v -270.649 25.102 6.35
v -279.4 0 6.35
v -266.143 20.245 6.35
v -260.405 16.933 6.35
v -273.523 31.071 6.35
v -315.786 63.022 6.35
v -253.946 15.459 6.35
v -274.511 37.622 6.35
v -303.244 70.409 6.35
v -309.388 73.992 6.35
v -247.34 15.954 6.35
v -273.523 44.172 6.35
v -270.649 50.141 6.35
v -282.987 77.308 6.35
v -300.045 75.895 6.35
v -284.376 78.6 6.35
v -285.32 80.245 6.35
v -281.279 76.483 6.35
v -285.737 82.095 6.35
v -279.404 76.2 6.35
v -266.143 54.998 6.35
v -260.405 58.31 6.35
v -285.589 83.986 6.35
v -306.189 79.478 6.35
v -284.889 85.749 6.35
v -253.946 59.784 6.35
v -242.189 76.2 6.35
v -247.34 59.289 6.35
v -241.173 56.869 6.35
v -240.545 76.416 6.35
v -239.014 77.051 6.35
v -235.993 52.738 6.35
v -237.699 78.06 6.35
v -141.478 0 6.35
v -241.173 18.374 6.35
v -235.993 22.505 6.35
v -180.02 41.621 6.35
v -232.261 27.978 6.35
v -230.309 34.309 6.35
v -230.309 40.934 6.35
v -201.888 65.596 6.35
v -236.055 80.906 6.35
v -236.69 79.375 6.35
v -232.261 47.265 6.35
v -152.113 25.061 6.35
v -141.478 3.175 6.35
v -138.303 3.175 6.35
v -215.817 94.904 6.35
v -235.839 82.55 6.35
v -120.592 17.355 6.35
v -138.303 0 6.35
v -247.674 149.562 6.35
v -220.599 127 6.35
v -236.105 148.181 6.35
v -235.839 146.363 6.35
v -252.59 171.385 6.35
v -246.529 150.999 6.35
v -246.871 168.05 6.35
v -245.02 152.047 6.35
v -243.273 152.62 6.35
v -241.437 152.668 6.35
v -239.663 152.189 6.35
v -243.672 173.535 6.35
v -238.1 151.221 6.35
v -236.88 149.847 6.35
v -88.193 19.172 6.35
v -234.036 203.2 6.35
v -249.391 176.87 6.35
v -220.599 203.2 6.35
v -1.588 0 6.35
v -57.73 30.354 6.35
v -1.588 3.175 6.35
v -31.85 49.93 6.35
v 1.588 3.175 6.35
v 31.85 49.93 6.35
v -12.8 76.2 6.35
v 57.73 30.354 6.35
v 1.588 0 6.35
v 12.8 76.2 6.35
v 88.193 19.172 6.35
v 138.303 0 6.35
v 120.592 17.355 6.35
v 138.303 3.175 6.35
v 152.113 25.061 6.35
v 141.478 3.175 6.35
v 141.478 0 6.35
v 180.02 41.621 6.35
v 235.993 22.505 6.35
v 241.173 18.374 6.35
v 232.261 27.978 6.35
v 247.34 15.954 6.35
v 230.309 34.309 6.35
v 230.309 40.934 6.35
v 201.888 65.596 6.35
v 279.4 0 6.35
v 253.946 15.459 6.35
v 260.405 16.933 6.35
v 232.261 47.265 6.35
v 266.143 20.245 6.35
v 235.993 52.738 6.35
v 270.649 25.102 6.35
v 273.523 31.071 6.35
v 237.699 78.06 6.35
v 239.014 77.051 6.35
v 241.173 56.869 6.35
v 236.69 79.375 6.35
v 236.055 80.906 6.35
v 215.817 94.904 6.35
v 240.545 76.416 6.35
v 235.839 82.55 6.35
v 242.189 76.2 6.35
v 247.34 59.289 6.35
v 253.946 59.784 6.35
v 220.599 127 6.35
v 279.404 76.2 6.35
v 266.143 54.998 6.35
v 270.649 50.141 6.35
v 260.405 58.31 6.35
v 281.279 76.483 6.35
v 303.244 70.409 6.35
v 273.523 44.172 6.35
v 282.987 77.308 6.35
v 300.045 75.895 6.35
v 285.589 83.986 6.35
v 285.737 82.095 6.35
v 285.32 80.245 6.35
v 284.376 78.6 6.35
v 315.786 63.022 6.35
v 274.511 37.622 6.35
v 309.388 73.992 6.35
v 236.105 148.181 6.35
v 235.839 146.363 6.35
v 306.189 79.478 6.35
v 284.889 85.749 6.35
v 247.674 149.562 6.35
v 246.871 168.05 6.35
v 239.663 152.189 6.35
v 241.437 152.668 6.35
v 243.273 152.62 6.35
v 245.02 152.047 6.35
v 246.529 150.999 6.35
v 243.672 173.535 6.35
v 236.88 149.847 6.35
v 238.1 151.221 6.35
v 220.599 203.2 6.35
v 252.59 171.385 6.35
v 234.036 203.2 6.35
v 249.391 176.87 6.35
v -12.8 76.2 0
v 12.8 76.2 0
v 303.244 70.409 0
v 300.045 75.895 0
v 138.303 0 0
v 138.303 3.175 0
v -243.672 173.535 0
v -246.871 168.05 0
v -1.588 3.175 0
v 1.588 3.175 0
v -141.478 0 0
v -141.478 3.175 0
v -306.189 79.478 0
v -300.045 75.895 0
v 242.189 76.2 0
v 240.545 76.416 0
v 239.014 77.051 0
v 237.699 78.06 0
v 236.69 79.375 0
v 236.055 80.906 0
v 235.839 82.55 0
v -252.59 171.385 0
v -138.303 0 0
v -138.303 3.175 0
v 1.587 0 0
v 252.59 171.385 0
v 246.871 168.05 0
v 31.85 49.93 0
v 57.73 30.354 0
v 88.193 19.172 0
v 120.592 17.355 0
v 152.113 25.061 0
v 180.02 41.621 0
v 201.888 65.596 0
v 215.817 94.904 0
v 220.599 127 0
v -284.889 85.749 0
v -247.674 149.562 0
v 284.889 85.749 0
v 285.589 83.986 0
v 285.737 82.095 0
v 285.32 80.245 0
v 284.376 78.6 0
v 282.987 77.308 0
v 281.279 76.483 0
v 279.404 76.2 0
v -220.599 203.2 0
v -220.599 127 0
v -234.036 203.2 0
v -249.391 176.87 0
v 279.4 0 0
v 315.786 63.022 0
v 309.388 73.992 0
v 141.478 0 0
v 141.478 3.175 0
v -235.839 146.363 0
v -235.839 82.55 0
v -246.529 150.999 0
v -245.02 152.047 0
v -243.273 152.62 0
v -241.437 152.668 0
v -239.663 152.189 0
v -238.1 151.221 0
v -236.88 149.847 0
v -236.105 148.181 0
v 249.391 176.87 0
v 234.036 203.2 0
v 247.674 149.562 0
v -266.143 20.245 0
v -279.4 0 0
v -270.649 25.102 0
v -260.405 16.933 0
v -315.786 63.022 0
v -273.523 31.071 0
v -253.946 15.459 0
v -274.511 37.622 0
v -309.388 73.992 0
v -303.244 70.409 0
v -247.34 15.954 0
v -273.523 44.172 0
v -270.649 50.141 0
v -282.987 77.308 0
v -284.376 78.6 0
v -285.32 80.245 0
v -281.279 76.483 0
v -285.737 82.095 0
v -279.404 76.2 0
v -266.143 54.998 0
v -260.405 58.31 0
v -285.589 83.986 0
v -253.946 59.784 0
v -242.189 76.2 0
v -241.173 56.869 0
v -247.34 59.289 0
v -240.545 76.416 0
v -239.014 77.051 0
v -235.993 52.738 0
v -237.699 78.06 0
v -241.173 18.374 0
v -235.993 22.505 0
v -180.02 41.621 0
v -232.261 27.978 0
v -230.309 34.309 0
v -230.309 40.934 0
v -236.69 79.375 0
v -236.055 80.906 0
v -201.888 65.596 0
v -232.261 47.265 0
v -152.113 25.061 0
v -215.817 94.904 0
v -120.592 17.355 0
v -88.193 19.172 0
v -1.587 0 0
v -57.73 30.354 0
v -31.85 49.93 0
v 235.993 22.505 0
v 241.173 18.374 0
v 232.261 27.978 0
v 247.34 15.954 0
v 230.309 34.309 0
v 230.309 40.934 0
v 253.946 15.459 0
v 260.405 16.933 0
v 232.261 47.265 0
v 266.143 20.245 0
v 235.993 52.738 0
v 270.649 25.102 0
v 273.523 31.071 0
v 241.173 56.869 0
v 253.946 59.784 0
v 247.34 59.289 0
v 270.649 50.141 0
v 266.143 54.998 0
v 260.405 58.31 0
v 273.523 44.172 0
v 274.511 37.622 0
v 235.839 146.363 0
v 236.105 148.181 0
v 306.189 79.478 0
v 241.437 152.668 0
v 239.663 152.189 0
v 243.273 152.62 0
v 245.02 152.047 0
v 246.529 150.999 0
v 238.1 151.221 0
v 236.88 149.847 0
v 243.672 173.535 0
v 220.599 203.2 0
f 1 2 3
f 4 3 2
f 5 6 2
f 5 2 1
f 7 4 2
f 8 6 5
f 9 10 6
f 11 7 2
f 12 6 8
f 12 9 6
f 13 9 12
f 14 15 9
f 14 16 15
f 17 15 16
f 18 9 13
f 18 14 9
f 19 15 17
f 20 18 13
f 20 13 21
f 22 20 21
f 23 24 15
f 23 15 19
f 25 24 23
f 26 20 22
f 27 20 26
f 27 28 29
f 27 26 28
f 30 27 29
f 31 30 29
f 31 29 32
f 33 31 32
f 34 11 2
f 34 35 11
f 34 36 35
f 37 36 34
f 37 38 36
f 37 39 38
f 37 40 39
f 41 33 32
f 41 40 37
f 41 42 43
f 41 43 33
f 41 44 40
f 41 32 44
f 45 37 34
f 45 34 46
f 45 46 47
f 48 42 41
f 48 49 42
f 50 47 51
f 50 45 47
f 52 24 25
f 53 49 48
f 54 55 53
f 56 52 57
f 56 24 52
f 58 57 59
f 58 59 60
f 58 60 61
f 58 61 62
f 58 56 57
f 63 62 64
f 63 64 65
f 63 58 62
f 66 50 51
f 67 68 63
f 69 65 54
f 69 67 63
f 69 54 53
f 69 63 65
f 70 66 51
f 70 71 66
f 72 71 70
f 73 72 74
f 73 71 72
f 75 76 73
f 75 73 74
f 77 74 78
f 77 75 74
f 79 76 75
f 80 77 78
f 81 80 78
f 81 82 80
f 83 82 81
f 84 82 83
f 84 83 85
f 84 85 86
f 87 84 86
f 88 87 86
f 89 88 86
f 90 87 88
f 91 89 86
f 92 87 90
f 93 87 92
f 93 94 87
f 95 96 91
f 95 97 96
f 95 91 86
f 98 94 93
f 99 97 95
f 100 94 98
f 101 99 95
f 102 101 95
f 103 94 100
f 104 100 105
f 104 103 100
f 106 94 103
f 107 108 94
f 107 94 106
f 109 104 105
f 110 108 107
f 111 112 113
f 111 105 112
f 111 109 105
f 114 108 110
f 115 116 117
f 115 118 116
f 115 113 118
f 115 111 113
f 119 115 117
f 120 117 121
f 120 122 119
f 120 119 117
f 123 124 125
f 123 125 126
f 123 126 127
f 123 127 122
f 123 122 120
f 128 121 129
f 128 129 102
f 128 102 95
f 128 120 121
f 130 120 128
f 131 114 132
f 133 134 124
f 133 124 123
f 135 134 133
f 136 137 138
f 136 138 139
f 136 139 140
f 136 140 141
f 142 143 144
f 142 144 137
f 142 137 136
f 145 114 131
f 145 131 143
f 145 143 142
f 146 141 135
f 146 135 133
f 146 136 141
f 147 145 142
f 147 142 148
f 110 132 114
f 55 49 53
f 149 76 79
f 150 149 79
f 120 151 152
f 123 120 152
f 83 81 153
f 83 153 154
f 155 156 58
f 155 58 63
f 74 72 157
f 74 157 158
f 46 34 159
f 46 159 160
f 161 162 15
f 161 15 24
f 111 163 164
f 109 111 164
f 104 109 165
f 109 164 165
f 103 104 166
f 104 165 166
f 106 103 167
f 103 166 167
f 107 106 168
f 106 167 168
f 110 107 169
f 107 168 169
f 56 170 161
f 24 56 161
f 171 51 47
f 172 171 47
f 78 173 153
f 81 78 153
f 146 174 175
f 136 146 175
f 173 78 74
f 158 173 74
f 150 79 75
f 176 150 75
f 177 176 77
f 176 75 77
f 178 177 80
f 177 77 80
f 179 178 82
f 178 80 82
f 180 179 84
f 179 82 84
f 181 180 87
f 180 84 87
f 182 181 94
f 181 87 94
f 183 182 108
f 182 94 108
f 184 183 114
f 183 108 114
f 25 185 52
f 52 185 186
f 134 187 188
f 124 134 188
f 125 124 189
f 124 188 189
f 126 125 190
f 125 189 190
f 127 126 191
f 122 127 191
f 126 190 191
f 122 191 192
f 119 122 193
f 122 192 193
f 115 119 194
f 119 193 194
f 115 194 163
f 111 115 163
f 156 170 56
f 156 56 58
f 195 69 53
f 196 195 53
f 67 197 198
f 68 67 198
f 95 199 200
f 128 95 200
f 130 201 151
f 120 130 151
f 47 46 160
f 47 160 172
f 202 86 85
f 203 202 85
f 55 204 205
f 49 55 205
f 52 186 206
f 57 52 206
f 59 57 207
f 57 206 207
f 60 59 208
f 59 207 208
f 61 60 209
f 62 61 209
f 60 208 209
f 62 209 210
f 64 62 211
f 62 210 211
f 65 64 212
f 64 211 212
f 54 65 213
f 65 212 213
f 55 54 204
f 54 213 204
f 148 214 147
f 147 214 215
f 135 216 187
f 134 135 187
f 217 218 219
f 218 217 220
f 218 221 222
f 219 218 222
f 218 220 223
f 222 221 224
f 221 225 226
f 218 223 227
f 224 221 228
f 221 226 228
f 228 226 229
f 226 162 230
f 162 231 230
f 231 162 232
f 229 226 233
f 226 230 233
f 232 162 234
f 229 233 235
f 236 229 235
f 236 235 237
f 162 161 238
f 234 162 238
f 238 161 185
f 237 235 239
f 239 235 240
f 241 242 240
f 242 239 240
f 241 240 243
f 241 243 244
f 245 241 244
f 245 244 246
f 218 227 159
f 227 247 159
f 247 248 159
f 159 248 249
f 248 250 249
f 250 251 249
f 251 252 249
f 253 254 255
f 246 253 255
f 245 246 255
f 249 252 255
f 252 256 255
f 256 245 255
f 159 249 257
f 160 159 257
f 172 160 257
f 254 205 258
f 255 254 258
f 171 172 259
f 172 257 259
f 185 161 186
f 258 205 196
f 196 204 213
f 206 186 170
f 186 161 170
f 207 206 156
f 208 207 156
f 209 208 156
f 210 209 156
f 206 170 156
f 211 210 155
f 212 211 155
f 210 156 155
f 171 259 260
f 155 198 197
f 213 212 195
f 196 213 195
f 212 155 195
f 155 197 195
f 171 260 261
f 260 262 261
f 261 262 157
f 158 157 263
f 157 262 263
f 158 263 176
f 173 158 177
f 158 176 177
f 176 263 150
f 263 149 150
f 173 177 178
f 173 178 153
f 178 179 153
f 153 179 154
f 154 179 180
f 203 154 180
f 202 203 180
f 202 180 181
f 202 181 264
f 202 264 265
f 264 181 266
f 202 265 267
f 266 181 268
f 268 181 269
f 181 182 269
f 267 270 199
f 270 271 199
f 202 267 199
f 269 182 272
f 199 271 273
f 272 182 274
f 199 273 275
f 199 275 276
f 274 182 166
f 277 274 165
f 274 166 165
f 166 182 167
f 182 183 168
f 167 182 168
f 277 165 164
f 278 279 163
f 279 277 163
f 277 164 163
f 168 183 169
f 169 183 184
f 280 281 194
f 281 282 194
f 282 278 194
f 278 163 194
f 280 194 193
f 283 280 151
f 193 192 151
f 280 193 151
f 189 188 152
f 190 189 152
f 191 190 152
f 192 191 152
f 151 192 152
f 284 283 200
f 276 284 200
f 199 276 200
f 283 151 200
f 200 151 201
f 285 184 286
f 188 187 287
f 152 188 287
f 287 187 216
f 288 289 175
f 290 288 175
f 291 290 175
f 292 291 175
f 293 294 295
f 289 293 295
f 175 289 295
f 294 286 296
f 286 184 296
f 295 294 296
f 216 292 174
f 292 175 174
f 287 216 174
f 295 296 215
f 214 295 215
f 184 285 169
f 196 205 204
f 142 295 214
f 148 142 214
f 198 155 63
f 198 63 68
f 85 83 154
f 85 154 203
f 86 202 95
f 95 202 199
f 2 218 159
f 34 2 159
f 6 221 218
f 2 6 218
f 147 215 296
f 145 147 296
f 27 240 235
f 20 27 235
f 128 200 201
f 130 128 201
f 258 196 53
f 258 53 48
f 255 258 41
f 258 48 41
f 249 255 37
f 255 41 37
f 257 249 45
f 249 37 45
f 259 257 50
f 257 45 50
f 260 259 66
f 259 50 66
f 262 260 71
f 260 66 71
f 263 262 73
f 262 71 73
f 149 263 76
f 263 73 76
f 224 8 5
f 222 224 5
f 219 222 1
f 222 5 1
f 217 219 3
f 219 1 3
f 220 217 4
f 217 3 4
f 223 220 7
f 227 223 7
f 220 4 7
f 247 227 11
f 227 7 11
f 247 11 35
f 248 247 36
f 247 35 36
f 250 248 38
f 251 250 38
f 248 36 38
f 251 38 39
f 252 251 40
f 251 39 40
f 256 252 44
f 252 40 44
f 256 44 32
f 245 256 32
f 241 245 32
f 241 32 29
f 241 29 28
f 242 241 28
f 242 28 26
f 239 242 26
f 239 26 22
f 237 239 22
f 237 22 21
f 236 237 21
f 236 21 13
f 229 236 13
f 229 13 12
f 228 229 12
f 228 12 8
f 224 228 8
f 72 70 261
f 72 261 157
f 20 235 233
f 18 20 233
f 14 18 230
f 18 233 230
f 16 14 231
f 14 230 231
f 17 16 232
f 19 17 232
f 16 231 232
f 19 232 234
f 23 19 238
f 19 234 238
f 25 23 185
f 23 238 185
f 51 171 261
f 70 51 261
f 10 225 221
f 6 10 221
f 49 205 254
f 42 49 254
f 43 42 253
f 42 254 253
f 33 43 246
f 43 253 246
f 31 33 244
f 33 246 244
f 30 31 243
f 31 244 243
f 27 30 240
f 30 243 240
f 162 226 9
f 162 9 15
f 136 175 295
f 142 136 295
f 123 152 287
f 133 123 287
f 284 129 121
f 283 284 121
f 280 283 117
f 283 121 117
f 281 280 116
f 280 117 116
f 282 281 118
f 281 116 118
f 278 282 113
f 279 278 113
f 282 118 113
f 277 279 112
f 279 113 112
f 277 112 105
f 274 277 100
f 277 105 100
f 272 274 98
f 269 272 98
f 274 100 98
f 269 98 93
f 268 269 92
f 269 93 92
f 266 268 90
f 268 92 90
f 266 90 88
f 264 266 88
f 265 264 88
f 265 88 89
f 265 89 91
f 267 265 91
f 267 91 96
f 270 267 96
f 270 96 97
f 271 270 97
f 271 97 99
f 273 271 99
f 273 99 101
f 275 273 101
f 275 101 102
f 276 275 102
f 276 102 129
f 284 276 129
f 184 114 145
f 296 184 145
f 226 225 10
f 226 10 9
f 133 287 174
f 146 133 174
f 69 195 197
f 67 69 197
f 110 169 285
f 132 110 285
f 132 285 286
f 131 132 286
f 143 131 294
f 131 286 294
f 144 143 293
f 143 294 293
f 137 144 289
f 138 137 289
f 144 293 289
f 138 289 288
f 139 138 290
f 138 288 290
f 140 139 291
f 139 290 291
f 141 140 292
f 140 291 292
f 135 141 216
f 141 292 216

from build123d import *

# Parameters (mm, degrees)
BOSS_EXTRUDE1_DEPTH = 6.35
CUT_EXTRUDE3_REACH  = 377.568
SKETCH4_R           = 110.109
SKETCH9_R           = 22.225
CUT_EXTRUDE8_DEPTH  = 376.567629742
SKETCH11_W          = 3.175
SKETCH11_H          = 3.175
CUT_EXTRUDE10_DEPTH = 376.567629742
CUT_EXTRUDE12_DEPTH = 376.567629742
CUT_EXTRUDE15_DEPTH = 376.567629742
CUT_EXTRUDE18_DEPTH = 376.567629742


with BuildPart() as part:
    # Sketch1 → Boss-Extrude1 (new body)
    with BuildSketch(Plane.XY):
        Polygon((279.4, 0), (315.7855, 63.021534659), (234.035835214, 203.2), (-234.035835214, 203.2), (-315.7855, 63.021534659), (-279.4, 0), align=None)
    extrude(amount=BOSS_EXTRUDE1_DEPTH)

    # Sketch4 → Cut-Extrude3 (cut, up to next)
    with BuildSketch(Plane.XY.offset(6.35), mode=Mode.PRIVATE) as cut_extrude3_sk1:
        with Locations((110.49, 127)):
            Circle(SKETCH4_R)
    cut_extrude3_tool1 = extrude(cut_extrude3_sk1.sketch, amount=-CUT_EXTRUDE3_REACH, mode=Mode.PRIVATE) & part.part
    # Sketch4 → Cut-Extrude3 (cut, up to next)
    with BuildSketch(Plane.XY.offset(6.35), mode=Mode.PRIVATE) as cut_extrude3_sk2:
        with Locations((-110.49, 127)):
            Circle(SKETCH4_R)
    cut_extrude3_tool2 = extrude(cut_extrude3_sk2.sketch, amount=-CUT_EXTRUDE3_REACH, mode=Mode.PRIVATE) & part.part
    add(cut_extrude3_tool1.solids().sort_by_distance((110.49, 127, 6.35))[0], mode=Mode.SUBTRACT)
    add(cut_extrude3_tool2.solids().sort_by_distance((-110.49, 127, 6.35))[0], mode=Mode.SUBTRACT)

    # Sketch9 → Cut-Extrude8 (cut, through all)
    with BuildSketch(Plane.XY.offset(6.35)):
        with Locations((252.2855, 37.621534659)):
            Circle(SKETCH9_R)
        with Locations(Location((-252.2855, 37.621534659, 0), (0, 0, 180))):
            Circle(SKETCH9_R)
    extrude(amount=-CUT_EXTRUDE8_DEPTH, mode=Mode.SUBTRACT)

    # Sketch11 → Cut-Extrude10 (cut, through all)
    with BuildSketch(Plane.XY.offset(6.35)):
        with Locations((139.8905, 1.5875)):
            Rectangle(SKETCH11_W, SKETCH11_H)
        with Locations((0, 1.5875)):
            Rectangle(SKETCH11_W, SKETCH11_H)
        with Locations((-139.8905, 1.5875)):
            Rectangle(SKETCH11_W, SKETCH11_H)
    extrude(amount=-CUT_EXTRUDE10_DEPTH, mode=Mode.SUBTRACT)

    # Sketch13 → Cut-Extrude12 (cut, through all)
    with BuildSketch(Plane.XY.offset(6.35)):
        Polygon((-37.517518134, 76.2), (35.644230094, 76.2), (220.599, 127), (220.599, 203.2), (-220.599, 203.2), (-220.599, 127), align=None)
    extrude(amount=-CUT_EXTRUDE12_DEPTH, mode=Mode.SUBTRACT)

    # Sketch16 → Cut-Extrude15 (cut, through all)
    with BuildSketch(Plane(origin=(0, 0, 0), x_dir=(-1, 0, 0), z_dir=(0, 0, -1))):
        with BuildLine():
            Line((-247.674355458, 149.561981252), (-284.88900676, 85.748964754))
            ThreePointArc((-284.88900676, 85.748964754), (-284.909826298, 79.387005073), (-279.403651302, 76.2))
            Line((-279.403651302, 76.2), (-242.189, 76.2))
            ThreePointArc((-242.189, 76.2), (-237.698871939, 78.059871939), (-235.839, 82.55))
            Line((-235.839, 82.55), (-235.839, 146.363016498))
            ThreePointArc((-235.839, 146.363016498), (-240.532121483, 152.493045338), (-247.674355458, 149.561981252))
        make_face()
        with BuildLine():
            Line((242.189, 76.2), (279.403651302, 76.2))
            ThreePointArc((279.403651302, 76.2), (284.909826298, 79.387005073), (284.88900676, 85.748964754))
            Line((284.88900676, 85.748964754), (247.674355458, 149.561981252))
            ThreePointArc((247.674355458, 149.561981252), (240.532121483, 152.493045338), (235.839, 146.363016498))
            Line((235.839, 146.363016498), (235.839, 82.55))
            ThreePointArc((235.839, 82.55), (237.698871939, 78.059871939), (242.189, 76.2))
        make_face()
    extrude(amount=-CUT_EXTRUDE15_DEPTH, mode=Mode.SUBTRACT)

    # Sketch19 → Cut-Extrude18 (cut, through all)
    with BuildSketch(Plane(origin=(0, 0, 0), x_dir=(-1, 0, 0), z_dir=(0, 0, -1))):
        Polygon((-306.188605737, 79.477601033), (-309.387570492, 73.992245575), (-303.243972379, 70.40940505), (-300.045007624, 75.894760508), align=None)
        Polygon((-253.014789274, 171.632766807), (-246.871191161, 168.049926283), (-243.672226407, 173.535281741), (-249.81582452, 177.118122266), align=None)
        Polygon((249.81582452, 177.118122266), (253.014789274, 171.632766807), (246.871191161, 168.049926283), (243.672226407, 173.535281741), align=None)
        Polygon((300.045007624, 75.894760508), (306.188605737, 79.477601033), (309.387570492, 73.992245575), (303.243972379, 70.40940505), align=None)
    extrude(amount=-CUT_EXTRUDE18_DEPTH, mode=Mode.SUBTRACT)


solid = part.part
